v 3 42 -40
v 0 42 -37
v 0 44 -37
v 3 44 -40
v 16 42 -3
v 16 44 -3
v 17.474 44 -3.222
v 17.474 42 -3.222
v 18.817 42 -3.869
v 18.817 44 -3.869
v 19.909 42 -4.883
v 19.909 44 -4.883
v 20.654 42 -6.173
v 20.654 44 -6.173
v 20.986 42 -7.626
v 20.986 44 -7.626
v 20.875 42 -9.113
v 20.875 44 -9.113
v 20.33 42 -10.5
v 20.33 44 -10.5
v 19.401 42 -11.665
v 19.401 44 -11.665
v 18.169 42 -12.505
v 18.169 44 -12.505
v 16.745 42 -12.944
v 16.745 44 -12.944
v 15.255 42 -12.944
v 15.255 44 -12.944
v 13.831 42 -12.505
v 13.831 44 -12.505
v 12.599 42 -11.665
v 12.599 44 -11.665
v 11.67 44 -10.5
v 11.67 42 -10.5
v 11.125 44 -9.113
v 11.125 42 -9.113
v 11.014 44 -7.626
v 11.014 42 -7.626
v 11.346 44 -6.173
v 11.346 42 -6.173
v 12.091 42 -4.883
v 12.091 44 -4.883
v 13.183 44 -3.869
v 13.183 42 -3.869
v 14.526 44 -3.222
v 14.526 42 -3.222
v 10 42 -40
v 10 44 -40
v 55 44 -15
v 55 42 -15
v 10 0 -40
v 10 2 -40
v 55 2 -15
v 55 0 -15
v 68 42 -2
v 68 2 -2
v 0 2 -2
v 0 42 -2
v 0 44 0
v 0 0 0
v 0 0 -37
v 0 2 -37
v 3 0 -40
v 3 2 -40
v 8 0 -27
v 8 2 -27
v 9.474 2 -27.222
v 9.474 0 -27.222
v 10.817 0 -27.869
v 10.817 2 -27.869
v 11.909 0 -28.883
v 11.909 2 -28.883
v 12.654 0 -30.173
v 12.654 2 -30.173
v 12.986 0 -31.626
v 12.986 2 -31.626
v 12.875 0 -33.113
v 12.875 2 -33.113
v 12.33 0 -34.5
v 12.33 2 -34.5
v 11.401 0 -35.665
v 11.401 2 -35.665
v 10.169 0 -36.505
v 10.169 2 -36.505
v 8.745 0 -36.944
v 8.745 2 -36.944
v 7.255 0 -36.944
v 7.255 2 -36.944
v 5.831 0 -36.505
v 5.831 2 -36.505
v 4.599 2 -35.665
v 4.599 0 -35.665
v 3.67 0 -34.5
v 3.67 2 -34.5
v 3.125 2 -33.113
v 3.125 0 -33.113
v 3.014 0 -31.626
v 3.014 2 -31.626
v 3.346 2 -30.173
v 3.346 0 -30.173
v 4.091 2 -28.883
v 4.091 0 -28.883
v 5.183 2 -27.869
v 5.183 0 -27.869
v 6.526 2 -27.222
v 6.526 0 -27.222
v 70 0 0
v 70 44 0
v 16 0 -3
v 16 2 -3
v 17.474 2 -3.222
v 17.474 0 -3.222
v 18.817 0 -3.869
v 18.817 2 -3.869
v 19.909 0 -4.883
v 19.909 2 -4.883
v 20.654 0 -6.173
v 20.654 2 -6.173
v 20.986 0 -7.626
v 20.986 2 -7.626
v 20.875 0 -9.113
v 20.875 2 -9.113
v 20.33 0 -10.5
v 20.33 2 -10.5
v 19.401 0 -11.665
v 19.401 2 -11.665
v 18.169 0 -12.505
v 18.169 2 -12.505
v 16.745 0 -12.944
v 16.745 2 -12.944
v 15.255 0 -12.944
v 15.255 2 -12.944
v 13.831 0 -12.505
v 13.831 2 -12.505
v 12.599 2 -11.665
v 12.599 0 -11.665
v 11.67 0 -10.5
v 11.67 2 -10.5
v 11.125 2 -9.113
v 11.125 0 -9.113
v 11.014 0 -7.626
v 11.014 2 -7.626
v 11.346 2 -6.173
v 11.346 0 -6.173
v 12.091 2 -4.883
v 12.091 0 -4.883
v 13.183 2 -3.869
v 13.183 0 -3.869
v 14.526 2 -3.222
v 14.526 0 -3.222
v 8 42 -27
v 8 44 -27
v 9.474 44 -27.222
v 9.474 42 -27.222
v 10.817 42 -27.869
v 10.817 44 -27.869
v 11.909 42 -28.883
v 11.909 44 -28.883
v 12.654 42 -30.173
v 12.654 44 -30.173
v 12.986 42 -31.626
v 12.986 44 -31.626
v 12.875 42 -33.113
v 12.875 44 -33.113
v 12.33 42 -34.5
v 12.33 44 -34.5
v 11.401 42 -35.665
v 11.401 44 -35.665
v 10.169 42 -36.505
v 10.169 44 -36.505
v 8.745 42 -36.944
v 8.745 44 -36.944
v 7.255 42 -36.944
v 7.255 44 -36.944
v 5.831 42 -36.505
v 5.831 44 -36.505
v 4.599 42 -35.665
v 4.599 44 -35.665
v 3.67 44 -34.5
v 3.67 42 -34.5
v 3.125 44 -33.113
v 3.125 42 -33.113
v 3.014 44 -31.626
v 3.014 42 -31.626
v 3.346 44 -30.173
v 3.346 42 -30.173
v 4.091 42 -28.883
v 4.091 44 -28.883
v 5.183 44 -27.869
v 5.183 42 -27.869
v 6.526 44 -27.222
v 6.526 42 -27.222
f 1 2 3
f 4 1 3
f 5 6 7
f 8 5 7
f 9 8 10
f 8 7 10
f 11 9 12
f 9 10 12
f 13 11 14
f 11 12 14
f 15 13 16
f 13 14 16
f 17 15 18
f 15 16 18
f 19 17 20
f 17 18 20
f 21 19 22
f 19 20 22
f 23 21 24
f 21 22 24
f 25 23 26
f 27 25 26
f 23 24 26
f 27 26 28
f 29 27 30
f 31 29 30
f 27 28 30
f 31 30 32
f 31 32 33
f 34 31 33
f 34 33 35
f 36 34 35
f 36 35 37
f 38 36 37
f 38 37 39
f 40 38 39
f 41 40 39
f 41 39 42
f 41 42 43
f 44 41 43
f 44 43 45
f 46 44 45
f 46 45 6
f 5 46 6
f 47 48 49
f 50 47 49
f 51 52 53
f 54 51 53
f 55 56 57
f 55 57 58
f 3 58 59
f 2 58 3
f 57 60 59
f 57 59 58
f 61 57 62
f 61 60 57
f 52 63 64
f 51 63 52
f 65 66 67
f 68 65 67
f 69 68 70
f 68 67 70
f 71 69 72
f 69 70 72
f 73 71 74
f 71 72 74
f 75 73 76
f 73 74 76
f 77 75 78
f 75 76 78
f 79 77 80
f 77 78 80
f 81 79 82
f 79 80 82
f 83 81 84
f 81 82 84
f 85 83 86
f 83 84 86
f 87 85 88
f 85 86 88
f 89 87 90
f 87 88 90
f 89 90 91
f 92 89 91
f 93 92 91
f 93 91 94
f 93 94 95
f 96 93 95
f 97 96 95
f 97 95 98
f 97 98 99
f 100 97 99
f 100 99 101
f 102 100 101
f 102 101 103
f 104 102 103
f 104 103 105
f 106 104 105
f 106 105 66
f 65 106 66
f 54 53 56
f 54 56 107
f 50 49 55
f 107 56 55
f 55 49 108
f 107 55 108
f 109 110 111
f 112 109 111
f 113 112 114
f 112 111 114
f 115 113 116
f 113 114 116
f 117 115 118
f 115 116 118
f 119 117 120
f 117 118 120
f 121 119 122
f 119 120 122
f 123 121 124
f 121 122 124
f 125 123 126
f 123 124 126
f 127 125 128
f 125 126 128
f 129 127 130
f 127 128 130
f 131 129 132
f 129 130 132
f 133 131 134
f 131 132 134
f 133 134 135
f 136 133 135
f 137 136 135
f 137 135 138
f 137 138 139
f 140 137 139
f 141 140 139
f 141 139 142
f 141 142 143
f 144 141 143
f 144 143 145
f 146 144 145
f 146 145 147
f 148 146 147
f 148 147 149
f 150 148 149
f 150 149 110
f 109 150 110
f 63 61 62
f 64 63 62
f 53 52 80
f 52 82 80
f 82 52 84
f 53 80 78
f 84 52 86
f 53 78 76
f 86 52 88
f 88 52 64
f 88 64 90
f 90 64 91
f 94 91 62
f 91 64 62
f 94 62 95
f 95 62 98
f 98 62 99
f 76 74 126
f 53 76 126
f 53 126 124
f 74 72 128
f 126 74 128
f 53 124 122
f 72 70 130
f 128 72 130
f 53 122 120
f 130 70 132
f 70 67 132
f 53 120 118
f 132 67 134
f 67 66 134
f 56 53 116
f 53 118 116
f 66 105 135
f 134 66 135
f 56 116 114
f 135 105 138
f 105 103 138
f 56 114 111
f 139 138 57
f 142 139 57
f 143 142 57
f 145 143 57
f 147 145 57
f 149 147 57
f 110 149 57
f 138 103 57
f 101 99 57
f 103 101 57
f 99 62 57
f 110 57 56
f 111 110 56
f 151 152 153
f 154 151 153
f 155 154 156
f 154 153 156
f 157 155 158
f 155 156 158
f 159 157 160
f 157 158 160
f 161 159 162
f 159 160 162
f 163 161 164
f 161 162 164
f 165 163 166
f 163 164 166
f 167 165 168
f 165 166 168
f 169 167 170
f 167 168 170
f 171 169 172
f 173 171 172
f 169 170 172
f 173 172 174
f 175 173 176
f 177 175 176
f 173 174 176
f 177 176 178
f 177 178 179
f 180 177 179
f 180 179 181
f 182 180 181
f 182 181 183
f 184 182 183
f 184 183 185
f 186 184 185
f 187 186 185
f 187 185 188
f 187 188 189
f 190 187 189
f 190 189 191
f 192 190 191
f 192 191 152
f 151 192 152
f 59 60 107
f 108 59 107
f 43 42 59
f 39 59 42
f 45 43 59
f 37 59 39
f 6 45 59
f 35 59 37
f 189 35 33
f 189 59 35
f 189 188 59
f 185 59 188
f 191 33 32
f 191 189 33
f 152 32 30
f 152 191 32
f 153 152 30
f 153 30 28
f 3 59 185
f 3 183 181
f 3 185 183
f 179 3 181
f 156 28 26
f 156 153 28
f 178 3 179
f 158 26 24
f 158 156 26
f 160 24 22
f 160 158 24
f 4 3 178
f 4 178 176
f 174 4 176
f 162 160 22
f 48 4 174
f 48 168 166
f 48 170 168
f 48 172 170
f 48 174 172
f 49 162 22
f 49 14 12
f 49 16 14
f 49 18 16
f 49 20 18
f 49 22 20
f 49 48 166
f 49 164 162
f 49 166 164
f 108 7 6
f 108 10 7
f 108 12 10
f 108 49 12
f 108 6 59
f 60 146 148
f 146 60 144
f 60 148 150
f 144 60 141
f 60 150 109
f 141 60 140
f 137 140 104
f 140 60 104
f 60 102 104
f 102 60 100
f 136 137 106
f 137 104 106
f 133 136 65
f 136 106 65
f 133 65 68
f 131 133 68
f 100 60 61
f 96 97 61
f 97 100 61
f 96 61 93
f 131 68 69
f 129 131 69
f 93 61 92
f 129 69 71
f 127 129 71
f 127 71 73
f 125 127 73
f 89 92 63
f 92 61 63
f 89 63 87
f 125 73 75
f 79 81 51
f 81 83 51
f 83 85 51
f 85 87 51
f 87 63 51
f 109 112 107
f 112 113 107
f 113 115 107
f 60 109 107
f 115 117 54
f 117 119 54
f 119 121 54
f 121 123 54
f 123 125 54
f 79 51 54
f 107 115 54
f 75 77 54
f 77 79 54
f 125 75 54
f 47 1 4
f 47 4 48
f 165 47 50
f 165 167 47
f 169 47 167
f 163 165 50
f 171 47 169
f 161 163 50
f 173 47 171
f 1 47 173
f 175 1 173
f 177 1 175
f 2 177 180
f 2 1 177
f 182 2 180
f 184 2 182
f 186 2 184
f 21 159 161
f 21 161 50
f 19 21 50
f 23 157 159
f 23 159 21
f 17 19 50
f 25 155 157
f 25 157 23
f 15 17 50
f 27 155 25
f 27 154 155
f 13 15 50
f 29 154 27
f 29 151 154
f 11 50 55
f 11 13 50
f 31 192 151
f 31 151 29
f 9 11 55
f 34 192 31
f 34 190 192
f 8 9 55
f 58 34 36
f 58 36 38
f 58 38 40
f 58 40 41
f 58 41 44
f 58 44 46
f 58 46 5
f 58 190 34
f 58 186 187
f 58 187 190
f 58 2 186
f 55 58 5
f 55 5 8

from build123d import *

# Parameters (mm, degrees)
SKETCH4_W           = 70
SKETCH4_H           = 40
BOSS_EXTRUDE3_DEPTH = 44
SKETCH5_W           = 38
SKETCH5_H           = 40
CUT_EXTRUDE5_DEPTH  = 92.847700026
CUT_EXTRUDE8_DEPTH  = 92.847700026
CHAMFER2_SIZE       = 3
SKETCH9_R           = 5
CUT_EXTRUDE9_DEPTH  = 92.847700026


with BuildPart() as part:
    # Sketch4 → Boss-Extrude3 (new body)
    with BuildSketch(Plane(origin=(0, 0, 0), x_dir=(1, 0, 0), z_dir=(0, 1, 0))):
        with Locations((35, 20)):
            Rectangle(SKETCH4_W, SKETCH4_H)
    extrude(amount=BOSS_EXTRUDE3_DEPTH)

    # Sketch5 → Cut-Extrude5 (cut, through all)
    with BuildSketch(Plane.ZY):
        with Locations((-21, 22)):
            Rectangle(SKETCH5_W, SKETCH5_H)
    extrude(amount=-CUT_EXTRUDE5_DEPTH, mode=Mode.SUBTRACT)

    # Sketch8 → Cut-Extrude8 (cut, through all)
    with BuildSketch(Plane(origin=(0, 44, 0), x_dir=(1, 0, 0), z_dir=(0, 1, 0))):
        Polygon((10, 40), (55, 15), (70, 0), (70, 40), align=None)
    extrude(amount=-CUT_EXTRUDE8_DEPTH, mode=Mode.SUBTRACT)

    # Chamfer2
    chamfer2_edges = [part.edges().sort_by_distance(p)[0] for p in [
        (0, 1, -40),
        (0, 43, -40),
    ]]
    chamfer(chamfer2_edges, length=CHAMFER2_SIZE)

    # Sketch9 → Cut-Extrude9 (cut, through all)
    with BuildSketch(Plane(origin=(0, 44, 0), x_dir=(1, 0, 0), z_dir=(0, 1, 0))):
        with Locations(Location((8, 32, 0), (0, 0, 270))):
            Circle(SKETCH9_R)
        with Locations(Location((16, 8, 0), (0, 0, 270))):
            Circle(SKETCH9_R)
    extrude(amount=-CUT_EXTRUDE9_DEPTH, mode=Mode.SUBTRACT)


solid = part.part
